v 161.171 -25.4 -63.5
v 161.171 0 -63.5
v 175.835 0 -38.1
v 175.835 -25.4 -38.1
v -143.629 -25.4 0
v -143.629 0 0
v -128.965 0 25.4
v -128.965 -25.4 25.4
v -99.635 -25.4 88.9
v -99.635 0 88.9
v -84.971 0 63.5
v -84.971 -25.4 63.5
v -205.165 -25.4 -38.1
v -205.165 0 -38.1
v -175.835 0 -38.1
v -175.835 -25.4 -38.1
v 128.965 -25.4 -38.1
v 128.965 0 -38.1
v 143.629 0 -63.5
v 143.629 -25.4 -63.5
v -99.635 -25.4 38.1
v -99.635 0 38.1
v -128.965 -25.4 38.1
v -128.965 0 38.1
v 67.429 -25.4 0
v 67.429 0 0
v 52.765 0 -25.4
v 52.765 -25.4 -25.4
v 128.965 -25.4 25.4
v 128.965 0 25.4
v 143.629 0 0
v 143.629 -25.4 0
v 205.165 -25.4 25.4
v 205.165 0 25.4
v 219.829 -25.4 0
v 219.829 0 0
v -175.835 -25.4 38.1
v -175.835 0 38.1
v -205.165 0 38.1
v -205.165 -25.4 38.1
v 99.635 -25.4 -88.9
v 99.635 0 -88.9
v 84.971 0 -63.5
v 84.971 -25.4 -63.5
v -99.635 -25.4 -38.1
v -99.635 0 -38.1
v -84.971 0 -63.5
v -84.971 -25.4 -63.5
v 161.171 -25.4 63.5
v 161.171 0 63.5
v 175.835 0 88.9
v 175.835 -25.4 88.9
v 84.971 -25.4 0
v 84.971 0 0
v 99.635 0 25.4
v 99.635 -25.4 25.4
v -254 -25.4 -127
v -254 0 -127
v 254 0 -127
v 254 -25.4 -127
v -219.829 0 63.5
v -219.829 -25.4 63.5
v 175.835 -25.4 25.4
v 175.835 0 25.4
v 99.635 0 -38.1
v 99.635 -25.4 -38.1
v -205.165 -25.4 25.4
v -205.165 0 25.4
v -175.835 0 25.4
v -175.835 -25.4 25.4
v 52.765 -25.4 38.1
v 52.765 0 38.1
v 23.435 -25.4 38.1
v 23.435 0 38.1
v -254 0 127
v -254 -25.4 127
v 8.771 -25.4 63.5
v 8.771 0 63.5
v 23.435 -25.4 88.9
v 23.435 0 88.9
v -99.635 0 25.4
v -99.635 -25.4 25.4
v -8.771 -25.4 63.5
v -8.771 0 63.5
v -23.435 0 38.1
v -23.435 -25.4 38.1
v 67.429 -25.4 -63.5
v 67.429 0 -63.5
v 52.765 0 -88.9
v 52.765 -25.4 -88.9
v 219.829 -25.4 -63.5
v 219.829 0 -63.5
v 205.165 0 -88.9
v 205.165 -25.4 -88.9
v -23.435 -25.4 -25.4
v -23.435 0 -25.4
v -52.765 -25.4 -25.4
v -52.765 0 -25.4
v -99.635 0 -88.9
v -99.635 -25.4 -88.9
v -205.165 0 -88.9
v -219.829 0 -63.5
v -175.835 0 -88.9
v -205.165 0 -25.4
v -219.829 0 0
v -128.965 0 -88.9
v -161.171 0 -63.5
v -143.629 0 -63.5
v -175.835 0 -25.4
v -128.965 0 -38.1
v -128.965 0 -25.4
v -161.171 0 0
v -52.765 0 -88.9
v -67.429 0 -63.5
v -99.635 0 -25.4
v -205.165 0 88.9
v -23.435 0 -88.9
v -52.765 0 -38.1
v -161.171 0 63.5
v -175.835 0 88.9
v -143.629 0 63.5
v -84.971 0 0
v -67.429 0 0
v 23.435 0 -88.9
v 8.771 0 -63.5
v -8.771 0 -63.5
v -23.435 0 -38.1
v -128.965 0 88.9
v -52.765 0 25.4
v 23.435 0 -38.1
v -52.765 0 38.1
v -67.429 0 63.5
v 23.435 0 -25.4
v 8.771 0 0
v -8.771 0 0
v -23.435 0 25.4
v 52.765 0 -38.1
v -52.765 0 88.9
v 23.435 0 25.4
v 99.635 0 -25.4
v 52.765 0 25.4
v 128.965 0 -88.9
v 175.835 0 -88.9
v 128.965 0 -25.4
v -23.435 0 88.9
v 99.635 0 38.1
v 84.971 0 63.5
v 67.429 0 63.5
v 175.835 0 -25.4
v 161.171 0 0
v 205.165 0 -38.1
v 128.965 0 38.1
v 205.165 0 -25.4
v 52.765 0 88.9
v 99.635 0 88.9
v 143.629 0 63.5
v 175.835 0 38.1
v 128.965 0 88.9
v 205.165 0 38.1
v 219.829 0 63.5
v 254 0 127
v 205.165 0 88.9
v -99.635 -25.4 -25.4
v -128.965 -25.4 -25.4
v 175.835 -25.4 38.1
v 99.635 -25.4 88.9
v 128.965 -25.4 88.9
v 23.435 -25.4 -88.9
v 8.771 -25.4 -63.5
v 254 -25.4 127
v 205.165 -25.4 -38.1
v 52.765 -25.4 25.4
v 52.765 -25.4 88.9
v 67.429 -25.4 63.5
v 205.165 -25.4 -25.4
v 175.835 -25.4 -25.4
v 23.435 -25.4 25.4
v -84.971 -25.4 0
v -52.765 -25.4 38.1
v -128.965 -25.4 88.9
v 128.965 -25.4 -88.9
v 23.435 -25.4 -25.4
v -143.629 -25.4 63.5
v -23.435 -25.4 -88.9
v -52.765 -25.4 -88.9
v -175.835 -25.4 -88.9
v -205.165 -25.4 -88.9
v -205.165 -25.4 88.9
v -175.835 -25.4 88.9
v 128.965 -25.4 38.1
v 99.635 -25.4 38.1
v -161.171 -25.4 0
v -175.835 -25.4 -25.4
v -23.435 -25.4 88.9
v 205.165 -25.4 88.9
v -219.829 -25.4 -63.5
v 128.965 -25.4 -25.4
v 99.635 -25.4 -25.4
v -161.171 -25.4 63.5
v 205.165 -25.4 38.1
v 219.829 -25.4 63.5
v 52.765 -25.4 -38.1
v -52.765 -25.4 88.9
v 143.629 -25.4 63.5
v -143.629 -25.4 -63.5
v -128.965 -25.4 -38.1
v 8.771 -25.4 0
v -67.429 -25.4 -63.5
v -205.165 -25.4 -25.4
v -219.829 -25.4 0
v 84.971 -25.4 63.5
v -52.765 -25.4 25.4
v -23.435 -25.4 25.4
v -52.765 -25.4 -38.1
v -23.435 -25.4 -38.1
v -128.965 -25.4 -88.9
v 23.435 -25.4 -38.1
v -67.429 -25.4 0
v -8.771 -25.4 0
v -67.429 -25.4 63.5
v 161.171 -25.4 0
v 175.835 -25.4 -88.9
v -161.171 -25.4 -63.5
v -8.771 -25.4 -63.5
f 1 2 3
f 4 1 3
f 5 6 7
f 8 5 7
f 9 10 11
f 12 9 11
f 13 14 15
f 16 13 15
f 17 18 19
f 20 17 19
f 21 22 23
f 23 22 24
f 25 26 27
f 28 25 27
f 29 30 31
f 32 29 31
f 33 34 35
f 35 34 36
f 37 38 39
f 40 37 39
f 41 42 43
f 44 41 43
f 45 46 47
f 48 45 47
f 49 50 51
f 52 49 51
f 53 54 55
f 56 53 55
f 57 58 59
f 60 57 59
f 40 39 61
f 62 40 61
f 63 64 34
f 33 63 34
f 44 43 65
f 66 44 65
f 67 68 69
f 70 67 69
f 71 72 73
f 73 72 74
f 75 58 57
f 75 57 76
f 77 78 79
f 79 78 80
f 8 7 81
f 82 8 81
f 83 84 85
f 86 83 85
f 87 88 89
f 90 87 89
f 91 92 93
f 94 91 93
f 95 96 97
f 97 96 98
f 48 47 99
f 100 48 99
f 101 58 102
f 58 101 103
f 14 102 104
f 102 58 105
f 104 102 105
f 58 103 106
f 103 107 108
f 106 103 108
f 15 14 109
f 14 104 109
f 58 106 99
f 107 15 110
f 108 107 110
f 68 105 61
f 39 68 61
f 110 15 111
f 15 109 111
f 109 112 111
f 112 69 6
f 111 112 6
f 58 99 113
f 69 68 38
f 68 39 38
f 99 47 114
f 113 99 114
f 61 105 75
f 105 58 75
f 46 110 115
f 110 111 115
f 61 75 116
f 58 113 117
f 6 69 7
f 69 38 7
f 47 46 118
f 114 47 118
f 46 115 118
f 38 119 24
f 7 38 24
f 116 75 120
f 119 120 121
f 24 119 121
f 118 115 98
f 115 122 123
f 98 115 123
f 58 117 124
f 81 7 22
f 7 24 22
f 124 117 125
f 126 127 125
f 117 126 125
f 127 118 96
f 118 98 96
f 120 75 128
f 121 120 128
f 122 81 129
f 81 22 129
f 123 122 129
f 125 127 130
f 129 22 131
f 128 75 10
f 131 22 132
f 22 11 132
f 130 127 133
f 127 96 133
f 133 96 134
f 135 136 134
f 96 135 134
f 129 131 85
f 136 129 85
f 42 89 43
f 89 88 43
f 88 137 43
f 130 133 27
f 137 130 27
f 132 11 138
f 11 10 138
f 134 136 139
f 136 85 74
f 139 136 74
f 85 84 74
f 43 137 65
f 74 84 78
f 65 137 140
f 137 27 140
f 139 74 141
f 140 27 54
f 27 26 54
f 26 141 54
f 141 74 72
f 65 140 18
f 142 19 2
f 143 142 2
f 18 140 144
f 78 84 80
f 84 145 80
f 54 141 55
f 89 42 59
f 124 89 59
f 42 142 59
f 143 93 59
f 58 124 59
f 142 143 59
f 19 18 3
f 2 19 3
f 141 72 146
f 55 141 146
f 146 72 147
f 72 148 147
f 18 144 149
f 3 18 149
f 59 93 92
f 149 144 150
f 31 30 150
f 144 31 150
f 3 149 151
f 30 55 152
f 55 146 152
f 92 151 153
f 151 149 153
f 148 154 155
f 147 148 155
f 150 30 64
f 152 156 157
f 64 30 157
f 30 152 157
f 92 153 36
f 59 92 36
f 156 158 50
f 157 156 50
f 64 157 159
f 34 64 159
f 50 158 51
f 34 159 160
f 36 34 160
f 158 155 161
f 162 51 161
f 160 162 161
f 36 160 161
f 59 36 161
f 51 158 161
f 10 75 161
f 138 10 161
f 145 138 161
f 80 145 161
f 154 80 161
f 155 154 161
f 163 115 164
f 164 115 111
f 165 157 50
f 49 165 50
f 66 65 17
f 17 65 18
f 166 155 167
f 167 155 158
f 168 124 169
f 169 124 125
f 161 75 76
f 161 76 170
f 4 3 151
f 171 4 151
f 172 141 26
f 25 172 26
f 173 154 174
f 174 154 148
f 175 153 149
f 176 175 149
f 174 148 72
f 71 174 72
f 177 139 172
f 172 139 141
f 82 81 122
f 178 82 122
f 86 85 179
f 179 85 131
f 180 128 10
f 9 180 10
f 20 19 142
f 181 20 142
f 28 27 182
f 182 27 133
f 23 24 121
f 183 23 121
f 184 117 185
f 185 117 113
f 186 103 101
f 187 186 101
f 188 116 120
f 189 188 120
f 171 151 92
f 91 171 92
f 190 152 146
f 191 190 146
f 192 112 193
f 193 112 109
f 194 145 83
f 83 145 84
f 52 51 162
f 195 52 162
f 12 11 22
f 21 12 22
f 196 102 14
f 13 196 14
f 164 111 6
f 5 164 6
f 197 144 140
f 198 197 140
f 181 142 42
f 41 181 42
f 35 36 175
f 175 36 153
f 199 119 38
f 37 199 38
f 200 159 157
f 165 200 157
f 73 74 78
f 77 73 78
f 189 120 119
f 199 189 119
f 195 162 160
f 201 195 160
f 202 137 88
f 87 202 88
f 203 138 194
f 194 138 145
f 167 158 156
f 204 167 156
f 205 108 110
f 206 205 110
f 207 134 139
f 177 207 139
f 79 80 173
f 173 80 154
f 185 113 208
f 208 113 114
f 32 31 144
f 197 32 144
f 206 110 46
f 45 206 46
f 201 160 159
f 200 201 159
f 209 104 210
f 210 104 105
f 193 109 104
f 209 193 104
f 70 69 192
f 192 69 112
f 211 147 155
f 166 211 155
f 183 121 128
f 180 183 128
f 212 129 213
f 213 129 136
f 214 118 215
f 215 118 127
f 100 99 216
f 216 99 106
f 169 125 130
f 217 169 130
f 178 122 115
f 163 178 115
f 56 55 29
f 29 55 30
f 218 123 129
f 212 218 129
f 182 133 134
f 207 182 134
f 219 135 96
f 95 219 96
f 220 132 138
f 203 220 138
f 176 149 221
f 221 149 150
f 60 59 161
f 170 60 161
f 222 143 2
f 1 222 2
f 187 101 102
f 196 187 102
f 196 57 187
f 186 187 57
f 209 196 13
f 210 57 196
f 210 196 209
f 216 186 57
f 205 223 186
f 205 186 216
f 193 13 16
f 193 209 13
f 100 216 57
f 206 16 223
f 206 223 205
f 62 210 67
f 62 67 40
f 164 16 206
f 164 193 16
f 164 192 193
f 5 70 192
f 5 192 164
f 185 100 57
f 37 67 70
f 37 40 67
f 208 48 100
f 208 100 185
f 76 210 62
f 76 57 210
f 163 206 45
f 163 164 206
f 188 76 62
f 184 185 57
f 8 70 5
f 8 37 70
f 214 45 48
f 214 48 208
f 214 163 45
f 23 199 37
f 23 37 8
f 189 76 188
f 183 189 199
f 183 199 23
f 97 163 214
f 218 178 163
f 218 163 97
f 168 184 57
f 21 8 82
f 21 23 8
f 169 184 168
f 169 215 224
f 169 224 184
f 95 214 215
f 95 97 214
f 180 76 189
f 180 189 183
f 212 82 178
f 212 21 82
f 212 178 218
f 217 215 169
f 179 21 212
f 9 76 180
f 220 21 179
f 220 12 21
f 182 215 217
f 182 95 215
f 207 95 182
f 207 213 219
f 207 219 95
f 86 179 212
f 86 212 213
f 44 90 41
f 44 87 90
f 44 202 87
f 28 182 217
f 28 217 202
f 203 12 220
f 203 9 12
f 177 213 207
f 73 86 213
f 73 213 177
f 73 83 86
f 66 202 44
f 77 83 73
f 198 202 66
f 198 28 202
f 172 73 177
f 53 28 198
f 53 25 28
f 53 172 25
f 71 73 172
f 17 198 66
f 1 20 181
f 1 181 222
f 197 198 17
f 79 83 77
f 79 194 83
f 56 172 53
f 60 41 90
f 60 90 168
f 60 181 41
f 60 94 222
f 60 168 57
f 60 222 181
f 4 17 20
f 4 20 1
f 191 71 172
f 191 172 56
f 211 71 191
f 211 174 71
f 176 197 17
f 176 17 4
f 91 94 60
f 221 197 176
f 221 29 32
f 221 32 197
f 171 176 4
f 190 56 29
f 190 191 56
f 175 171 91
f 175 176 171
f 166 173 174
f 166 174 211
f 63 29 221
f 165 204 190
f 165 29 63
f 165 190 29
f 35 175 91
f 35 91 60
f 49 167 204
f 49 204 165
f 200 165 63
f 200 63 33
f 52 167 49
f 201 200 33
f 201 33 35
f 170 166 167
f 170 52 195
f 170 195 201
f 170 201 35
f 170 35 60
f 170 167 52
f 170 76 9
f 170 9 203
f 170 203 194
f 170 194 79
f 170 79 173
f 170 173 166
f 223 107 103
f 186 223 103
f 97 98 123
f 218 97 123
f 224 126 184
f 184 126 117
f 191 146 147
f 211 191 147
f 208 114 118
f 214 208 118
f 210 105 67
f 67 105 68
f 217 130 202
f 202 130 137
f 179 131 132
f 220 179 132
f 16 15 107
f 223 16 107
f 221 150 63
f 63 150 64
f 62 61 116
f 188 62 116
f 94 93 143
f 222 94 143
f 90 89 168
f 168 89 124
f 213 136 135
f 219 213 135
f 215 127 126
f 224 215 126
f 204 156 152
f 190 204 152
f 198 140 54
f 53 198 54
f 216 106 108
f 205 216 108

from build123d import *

# Parameters (mm, degrees)
F0_W     = 508
F0_H     = 254
F1_DEPTH = 25.4


with BuildPart() as f1:
    # F0 (on Front) → F1 (new body)
    with BuildSketch(Plane.XZ):
        Rectangle(F0_W, F0_H)
        Polygon((-161.170606, -63.5), (-175.835303, -88.9), (-205.164697, -88.9), (-219.829394, -63.5), (-205.164697, -38.1), (-175.835303, -38.1), align=None, mode=Mode.SUBTRACT)
        Polygon((-99.635303, -88.9), (-128.964697, -88.9), (-143.629394, -63.5), (-128.964697, -38.1), (-99.635303, -38.1), (-84.970606, -63.5), align=None, mode=Mode.SUBTRACT)
        Polygon((-67.429394, -63.5), (-52.764697, -38.1), (-23.435303, -38.1), (-8.770606, -63.5), (-23.435303, -88.9), (-52.764697, -88.9), align=None, mode=Mode.SUBTRACT)
        Polygon((52.764697, -88.9), (23.435303, -88.9), (8.770606, -63.5), (23.435303, -38.1), (52.764697, -38.1), (67.429394, -63.5), align=None, mode=Mode.SUBTRACT)
        Polygon((128.964697, -38.1), (143.629394, -63.5), (128.964697, -88.9), (99.635303, -88.9), (84.970606, -63.5), (99.635303, -38.1), align=None, mode=Mode.SUBTRACT)
        Polygon((205.164697, -88.9), (175.835303, -88.9), (161.170606, -63.5), (175.835303, -38.1), (205.164697, -38.1), (219.829394, -63.5), align=None, mode=Mode.SUBTRACT)
        Polygon((-161.170606, 0), (-175.835303, -25.4), (-205.164697, -25.4), (-219.829394, 0), (-205.164697, 25.4), (-175.835303, 25.4), align=None, mode=Mode.SUBTRACT)
        Polygon((-99.635303, -25.4), (-128.964697, -25.4), (-143.629394, 0), (-128.964697, 25.4), (-99.635303, 25.4), (-84.970606, 0), align=None, mode=Mode.SUBTRACT)
        Polygon((-67.429394, 0), (-52.764697, 25.4), (-23.435303, 25.4), (-8.770606, 0), (-23.435303, -25.4), (-52.764697, -25.4), align=None, mode=Mode.SUBTRACT)
        Polygon((-175.835303, 88.9), (-161.170606, 63.5), (-175.835303, 38.1), (-205.164697, 38.1), (-219.829394, 63.5), (-205.164697, 88.9), align=None, mode=Mode.SUBTRACT)
        Polygon((-99.635303, 88.9), (-84.970606, 63.5), (-99.635303, 38.1), (-128.964697, 38.1), (-143.629394, 63.5), (-128.964697, 88.9), align=None, mode=Mode.SUBTRACT)
        Polygon((-23.435303, 88.9), (-8.770606, 63.5), (-23.435303, 38.1), (-52.764697, 38.1), (-67.429394, 63.5), (-52.764697, 88.9), align=None, mode=Mode.SUBTRACT)
        Polygon((52.764697, -25.4), (23.435303, -25.4), (8.770606, 0), (23.435303, 25.4), (52.764697, 25.4), (67.429394, 0), align=None, mode=Mode.SUBTRACT)
        Polygon((128.964697, 25.4), (143.629394, 0), (128.964697, -25.4), (99.635303, -25.4), (84.970606, 0), (99.635303, 25.4), align=None, mode=Mode.SUBTRACT)
        Polygon((205.164697, -25.4), (175.835303, -25.4), (161.170606, 0), (175.835303, 25.4), (205.164697, 25.4), (219.829394, 0), align=None, mode=Mode.SUBTRACT)
        Polygon((52.764697, 88.9), (67.429394, 63.5), (52.764697, 38.1), (23.435303, 38.1), (8.770606, 63.5), (23.435303, 88.9), align=None, mode=Mode.SUBTRACT)
        Polygon((128.964697, 88.9), (143.629394, 63.5), (128.964697, 38.1), (99.635303, 38.1), (84.970606, 63.5), (99.635303, 88.9), align=None, mode=Mode.SUBTRACT)
        Polygon((205.164697, 88.9), (219.829394, 63.5), (205.164697, 38.1), (175.835303, 38.1), (161.170606, 63.5), (175.835303, 88.9), align=None, mode=Mode.SUBTRACT)
    extrude(amount=F1_DEPTH)


solid = f1.part
